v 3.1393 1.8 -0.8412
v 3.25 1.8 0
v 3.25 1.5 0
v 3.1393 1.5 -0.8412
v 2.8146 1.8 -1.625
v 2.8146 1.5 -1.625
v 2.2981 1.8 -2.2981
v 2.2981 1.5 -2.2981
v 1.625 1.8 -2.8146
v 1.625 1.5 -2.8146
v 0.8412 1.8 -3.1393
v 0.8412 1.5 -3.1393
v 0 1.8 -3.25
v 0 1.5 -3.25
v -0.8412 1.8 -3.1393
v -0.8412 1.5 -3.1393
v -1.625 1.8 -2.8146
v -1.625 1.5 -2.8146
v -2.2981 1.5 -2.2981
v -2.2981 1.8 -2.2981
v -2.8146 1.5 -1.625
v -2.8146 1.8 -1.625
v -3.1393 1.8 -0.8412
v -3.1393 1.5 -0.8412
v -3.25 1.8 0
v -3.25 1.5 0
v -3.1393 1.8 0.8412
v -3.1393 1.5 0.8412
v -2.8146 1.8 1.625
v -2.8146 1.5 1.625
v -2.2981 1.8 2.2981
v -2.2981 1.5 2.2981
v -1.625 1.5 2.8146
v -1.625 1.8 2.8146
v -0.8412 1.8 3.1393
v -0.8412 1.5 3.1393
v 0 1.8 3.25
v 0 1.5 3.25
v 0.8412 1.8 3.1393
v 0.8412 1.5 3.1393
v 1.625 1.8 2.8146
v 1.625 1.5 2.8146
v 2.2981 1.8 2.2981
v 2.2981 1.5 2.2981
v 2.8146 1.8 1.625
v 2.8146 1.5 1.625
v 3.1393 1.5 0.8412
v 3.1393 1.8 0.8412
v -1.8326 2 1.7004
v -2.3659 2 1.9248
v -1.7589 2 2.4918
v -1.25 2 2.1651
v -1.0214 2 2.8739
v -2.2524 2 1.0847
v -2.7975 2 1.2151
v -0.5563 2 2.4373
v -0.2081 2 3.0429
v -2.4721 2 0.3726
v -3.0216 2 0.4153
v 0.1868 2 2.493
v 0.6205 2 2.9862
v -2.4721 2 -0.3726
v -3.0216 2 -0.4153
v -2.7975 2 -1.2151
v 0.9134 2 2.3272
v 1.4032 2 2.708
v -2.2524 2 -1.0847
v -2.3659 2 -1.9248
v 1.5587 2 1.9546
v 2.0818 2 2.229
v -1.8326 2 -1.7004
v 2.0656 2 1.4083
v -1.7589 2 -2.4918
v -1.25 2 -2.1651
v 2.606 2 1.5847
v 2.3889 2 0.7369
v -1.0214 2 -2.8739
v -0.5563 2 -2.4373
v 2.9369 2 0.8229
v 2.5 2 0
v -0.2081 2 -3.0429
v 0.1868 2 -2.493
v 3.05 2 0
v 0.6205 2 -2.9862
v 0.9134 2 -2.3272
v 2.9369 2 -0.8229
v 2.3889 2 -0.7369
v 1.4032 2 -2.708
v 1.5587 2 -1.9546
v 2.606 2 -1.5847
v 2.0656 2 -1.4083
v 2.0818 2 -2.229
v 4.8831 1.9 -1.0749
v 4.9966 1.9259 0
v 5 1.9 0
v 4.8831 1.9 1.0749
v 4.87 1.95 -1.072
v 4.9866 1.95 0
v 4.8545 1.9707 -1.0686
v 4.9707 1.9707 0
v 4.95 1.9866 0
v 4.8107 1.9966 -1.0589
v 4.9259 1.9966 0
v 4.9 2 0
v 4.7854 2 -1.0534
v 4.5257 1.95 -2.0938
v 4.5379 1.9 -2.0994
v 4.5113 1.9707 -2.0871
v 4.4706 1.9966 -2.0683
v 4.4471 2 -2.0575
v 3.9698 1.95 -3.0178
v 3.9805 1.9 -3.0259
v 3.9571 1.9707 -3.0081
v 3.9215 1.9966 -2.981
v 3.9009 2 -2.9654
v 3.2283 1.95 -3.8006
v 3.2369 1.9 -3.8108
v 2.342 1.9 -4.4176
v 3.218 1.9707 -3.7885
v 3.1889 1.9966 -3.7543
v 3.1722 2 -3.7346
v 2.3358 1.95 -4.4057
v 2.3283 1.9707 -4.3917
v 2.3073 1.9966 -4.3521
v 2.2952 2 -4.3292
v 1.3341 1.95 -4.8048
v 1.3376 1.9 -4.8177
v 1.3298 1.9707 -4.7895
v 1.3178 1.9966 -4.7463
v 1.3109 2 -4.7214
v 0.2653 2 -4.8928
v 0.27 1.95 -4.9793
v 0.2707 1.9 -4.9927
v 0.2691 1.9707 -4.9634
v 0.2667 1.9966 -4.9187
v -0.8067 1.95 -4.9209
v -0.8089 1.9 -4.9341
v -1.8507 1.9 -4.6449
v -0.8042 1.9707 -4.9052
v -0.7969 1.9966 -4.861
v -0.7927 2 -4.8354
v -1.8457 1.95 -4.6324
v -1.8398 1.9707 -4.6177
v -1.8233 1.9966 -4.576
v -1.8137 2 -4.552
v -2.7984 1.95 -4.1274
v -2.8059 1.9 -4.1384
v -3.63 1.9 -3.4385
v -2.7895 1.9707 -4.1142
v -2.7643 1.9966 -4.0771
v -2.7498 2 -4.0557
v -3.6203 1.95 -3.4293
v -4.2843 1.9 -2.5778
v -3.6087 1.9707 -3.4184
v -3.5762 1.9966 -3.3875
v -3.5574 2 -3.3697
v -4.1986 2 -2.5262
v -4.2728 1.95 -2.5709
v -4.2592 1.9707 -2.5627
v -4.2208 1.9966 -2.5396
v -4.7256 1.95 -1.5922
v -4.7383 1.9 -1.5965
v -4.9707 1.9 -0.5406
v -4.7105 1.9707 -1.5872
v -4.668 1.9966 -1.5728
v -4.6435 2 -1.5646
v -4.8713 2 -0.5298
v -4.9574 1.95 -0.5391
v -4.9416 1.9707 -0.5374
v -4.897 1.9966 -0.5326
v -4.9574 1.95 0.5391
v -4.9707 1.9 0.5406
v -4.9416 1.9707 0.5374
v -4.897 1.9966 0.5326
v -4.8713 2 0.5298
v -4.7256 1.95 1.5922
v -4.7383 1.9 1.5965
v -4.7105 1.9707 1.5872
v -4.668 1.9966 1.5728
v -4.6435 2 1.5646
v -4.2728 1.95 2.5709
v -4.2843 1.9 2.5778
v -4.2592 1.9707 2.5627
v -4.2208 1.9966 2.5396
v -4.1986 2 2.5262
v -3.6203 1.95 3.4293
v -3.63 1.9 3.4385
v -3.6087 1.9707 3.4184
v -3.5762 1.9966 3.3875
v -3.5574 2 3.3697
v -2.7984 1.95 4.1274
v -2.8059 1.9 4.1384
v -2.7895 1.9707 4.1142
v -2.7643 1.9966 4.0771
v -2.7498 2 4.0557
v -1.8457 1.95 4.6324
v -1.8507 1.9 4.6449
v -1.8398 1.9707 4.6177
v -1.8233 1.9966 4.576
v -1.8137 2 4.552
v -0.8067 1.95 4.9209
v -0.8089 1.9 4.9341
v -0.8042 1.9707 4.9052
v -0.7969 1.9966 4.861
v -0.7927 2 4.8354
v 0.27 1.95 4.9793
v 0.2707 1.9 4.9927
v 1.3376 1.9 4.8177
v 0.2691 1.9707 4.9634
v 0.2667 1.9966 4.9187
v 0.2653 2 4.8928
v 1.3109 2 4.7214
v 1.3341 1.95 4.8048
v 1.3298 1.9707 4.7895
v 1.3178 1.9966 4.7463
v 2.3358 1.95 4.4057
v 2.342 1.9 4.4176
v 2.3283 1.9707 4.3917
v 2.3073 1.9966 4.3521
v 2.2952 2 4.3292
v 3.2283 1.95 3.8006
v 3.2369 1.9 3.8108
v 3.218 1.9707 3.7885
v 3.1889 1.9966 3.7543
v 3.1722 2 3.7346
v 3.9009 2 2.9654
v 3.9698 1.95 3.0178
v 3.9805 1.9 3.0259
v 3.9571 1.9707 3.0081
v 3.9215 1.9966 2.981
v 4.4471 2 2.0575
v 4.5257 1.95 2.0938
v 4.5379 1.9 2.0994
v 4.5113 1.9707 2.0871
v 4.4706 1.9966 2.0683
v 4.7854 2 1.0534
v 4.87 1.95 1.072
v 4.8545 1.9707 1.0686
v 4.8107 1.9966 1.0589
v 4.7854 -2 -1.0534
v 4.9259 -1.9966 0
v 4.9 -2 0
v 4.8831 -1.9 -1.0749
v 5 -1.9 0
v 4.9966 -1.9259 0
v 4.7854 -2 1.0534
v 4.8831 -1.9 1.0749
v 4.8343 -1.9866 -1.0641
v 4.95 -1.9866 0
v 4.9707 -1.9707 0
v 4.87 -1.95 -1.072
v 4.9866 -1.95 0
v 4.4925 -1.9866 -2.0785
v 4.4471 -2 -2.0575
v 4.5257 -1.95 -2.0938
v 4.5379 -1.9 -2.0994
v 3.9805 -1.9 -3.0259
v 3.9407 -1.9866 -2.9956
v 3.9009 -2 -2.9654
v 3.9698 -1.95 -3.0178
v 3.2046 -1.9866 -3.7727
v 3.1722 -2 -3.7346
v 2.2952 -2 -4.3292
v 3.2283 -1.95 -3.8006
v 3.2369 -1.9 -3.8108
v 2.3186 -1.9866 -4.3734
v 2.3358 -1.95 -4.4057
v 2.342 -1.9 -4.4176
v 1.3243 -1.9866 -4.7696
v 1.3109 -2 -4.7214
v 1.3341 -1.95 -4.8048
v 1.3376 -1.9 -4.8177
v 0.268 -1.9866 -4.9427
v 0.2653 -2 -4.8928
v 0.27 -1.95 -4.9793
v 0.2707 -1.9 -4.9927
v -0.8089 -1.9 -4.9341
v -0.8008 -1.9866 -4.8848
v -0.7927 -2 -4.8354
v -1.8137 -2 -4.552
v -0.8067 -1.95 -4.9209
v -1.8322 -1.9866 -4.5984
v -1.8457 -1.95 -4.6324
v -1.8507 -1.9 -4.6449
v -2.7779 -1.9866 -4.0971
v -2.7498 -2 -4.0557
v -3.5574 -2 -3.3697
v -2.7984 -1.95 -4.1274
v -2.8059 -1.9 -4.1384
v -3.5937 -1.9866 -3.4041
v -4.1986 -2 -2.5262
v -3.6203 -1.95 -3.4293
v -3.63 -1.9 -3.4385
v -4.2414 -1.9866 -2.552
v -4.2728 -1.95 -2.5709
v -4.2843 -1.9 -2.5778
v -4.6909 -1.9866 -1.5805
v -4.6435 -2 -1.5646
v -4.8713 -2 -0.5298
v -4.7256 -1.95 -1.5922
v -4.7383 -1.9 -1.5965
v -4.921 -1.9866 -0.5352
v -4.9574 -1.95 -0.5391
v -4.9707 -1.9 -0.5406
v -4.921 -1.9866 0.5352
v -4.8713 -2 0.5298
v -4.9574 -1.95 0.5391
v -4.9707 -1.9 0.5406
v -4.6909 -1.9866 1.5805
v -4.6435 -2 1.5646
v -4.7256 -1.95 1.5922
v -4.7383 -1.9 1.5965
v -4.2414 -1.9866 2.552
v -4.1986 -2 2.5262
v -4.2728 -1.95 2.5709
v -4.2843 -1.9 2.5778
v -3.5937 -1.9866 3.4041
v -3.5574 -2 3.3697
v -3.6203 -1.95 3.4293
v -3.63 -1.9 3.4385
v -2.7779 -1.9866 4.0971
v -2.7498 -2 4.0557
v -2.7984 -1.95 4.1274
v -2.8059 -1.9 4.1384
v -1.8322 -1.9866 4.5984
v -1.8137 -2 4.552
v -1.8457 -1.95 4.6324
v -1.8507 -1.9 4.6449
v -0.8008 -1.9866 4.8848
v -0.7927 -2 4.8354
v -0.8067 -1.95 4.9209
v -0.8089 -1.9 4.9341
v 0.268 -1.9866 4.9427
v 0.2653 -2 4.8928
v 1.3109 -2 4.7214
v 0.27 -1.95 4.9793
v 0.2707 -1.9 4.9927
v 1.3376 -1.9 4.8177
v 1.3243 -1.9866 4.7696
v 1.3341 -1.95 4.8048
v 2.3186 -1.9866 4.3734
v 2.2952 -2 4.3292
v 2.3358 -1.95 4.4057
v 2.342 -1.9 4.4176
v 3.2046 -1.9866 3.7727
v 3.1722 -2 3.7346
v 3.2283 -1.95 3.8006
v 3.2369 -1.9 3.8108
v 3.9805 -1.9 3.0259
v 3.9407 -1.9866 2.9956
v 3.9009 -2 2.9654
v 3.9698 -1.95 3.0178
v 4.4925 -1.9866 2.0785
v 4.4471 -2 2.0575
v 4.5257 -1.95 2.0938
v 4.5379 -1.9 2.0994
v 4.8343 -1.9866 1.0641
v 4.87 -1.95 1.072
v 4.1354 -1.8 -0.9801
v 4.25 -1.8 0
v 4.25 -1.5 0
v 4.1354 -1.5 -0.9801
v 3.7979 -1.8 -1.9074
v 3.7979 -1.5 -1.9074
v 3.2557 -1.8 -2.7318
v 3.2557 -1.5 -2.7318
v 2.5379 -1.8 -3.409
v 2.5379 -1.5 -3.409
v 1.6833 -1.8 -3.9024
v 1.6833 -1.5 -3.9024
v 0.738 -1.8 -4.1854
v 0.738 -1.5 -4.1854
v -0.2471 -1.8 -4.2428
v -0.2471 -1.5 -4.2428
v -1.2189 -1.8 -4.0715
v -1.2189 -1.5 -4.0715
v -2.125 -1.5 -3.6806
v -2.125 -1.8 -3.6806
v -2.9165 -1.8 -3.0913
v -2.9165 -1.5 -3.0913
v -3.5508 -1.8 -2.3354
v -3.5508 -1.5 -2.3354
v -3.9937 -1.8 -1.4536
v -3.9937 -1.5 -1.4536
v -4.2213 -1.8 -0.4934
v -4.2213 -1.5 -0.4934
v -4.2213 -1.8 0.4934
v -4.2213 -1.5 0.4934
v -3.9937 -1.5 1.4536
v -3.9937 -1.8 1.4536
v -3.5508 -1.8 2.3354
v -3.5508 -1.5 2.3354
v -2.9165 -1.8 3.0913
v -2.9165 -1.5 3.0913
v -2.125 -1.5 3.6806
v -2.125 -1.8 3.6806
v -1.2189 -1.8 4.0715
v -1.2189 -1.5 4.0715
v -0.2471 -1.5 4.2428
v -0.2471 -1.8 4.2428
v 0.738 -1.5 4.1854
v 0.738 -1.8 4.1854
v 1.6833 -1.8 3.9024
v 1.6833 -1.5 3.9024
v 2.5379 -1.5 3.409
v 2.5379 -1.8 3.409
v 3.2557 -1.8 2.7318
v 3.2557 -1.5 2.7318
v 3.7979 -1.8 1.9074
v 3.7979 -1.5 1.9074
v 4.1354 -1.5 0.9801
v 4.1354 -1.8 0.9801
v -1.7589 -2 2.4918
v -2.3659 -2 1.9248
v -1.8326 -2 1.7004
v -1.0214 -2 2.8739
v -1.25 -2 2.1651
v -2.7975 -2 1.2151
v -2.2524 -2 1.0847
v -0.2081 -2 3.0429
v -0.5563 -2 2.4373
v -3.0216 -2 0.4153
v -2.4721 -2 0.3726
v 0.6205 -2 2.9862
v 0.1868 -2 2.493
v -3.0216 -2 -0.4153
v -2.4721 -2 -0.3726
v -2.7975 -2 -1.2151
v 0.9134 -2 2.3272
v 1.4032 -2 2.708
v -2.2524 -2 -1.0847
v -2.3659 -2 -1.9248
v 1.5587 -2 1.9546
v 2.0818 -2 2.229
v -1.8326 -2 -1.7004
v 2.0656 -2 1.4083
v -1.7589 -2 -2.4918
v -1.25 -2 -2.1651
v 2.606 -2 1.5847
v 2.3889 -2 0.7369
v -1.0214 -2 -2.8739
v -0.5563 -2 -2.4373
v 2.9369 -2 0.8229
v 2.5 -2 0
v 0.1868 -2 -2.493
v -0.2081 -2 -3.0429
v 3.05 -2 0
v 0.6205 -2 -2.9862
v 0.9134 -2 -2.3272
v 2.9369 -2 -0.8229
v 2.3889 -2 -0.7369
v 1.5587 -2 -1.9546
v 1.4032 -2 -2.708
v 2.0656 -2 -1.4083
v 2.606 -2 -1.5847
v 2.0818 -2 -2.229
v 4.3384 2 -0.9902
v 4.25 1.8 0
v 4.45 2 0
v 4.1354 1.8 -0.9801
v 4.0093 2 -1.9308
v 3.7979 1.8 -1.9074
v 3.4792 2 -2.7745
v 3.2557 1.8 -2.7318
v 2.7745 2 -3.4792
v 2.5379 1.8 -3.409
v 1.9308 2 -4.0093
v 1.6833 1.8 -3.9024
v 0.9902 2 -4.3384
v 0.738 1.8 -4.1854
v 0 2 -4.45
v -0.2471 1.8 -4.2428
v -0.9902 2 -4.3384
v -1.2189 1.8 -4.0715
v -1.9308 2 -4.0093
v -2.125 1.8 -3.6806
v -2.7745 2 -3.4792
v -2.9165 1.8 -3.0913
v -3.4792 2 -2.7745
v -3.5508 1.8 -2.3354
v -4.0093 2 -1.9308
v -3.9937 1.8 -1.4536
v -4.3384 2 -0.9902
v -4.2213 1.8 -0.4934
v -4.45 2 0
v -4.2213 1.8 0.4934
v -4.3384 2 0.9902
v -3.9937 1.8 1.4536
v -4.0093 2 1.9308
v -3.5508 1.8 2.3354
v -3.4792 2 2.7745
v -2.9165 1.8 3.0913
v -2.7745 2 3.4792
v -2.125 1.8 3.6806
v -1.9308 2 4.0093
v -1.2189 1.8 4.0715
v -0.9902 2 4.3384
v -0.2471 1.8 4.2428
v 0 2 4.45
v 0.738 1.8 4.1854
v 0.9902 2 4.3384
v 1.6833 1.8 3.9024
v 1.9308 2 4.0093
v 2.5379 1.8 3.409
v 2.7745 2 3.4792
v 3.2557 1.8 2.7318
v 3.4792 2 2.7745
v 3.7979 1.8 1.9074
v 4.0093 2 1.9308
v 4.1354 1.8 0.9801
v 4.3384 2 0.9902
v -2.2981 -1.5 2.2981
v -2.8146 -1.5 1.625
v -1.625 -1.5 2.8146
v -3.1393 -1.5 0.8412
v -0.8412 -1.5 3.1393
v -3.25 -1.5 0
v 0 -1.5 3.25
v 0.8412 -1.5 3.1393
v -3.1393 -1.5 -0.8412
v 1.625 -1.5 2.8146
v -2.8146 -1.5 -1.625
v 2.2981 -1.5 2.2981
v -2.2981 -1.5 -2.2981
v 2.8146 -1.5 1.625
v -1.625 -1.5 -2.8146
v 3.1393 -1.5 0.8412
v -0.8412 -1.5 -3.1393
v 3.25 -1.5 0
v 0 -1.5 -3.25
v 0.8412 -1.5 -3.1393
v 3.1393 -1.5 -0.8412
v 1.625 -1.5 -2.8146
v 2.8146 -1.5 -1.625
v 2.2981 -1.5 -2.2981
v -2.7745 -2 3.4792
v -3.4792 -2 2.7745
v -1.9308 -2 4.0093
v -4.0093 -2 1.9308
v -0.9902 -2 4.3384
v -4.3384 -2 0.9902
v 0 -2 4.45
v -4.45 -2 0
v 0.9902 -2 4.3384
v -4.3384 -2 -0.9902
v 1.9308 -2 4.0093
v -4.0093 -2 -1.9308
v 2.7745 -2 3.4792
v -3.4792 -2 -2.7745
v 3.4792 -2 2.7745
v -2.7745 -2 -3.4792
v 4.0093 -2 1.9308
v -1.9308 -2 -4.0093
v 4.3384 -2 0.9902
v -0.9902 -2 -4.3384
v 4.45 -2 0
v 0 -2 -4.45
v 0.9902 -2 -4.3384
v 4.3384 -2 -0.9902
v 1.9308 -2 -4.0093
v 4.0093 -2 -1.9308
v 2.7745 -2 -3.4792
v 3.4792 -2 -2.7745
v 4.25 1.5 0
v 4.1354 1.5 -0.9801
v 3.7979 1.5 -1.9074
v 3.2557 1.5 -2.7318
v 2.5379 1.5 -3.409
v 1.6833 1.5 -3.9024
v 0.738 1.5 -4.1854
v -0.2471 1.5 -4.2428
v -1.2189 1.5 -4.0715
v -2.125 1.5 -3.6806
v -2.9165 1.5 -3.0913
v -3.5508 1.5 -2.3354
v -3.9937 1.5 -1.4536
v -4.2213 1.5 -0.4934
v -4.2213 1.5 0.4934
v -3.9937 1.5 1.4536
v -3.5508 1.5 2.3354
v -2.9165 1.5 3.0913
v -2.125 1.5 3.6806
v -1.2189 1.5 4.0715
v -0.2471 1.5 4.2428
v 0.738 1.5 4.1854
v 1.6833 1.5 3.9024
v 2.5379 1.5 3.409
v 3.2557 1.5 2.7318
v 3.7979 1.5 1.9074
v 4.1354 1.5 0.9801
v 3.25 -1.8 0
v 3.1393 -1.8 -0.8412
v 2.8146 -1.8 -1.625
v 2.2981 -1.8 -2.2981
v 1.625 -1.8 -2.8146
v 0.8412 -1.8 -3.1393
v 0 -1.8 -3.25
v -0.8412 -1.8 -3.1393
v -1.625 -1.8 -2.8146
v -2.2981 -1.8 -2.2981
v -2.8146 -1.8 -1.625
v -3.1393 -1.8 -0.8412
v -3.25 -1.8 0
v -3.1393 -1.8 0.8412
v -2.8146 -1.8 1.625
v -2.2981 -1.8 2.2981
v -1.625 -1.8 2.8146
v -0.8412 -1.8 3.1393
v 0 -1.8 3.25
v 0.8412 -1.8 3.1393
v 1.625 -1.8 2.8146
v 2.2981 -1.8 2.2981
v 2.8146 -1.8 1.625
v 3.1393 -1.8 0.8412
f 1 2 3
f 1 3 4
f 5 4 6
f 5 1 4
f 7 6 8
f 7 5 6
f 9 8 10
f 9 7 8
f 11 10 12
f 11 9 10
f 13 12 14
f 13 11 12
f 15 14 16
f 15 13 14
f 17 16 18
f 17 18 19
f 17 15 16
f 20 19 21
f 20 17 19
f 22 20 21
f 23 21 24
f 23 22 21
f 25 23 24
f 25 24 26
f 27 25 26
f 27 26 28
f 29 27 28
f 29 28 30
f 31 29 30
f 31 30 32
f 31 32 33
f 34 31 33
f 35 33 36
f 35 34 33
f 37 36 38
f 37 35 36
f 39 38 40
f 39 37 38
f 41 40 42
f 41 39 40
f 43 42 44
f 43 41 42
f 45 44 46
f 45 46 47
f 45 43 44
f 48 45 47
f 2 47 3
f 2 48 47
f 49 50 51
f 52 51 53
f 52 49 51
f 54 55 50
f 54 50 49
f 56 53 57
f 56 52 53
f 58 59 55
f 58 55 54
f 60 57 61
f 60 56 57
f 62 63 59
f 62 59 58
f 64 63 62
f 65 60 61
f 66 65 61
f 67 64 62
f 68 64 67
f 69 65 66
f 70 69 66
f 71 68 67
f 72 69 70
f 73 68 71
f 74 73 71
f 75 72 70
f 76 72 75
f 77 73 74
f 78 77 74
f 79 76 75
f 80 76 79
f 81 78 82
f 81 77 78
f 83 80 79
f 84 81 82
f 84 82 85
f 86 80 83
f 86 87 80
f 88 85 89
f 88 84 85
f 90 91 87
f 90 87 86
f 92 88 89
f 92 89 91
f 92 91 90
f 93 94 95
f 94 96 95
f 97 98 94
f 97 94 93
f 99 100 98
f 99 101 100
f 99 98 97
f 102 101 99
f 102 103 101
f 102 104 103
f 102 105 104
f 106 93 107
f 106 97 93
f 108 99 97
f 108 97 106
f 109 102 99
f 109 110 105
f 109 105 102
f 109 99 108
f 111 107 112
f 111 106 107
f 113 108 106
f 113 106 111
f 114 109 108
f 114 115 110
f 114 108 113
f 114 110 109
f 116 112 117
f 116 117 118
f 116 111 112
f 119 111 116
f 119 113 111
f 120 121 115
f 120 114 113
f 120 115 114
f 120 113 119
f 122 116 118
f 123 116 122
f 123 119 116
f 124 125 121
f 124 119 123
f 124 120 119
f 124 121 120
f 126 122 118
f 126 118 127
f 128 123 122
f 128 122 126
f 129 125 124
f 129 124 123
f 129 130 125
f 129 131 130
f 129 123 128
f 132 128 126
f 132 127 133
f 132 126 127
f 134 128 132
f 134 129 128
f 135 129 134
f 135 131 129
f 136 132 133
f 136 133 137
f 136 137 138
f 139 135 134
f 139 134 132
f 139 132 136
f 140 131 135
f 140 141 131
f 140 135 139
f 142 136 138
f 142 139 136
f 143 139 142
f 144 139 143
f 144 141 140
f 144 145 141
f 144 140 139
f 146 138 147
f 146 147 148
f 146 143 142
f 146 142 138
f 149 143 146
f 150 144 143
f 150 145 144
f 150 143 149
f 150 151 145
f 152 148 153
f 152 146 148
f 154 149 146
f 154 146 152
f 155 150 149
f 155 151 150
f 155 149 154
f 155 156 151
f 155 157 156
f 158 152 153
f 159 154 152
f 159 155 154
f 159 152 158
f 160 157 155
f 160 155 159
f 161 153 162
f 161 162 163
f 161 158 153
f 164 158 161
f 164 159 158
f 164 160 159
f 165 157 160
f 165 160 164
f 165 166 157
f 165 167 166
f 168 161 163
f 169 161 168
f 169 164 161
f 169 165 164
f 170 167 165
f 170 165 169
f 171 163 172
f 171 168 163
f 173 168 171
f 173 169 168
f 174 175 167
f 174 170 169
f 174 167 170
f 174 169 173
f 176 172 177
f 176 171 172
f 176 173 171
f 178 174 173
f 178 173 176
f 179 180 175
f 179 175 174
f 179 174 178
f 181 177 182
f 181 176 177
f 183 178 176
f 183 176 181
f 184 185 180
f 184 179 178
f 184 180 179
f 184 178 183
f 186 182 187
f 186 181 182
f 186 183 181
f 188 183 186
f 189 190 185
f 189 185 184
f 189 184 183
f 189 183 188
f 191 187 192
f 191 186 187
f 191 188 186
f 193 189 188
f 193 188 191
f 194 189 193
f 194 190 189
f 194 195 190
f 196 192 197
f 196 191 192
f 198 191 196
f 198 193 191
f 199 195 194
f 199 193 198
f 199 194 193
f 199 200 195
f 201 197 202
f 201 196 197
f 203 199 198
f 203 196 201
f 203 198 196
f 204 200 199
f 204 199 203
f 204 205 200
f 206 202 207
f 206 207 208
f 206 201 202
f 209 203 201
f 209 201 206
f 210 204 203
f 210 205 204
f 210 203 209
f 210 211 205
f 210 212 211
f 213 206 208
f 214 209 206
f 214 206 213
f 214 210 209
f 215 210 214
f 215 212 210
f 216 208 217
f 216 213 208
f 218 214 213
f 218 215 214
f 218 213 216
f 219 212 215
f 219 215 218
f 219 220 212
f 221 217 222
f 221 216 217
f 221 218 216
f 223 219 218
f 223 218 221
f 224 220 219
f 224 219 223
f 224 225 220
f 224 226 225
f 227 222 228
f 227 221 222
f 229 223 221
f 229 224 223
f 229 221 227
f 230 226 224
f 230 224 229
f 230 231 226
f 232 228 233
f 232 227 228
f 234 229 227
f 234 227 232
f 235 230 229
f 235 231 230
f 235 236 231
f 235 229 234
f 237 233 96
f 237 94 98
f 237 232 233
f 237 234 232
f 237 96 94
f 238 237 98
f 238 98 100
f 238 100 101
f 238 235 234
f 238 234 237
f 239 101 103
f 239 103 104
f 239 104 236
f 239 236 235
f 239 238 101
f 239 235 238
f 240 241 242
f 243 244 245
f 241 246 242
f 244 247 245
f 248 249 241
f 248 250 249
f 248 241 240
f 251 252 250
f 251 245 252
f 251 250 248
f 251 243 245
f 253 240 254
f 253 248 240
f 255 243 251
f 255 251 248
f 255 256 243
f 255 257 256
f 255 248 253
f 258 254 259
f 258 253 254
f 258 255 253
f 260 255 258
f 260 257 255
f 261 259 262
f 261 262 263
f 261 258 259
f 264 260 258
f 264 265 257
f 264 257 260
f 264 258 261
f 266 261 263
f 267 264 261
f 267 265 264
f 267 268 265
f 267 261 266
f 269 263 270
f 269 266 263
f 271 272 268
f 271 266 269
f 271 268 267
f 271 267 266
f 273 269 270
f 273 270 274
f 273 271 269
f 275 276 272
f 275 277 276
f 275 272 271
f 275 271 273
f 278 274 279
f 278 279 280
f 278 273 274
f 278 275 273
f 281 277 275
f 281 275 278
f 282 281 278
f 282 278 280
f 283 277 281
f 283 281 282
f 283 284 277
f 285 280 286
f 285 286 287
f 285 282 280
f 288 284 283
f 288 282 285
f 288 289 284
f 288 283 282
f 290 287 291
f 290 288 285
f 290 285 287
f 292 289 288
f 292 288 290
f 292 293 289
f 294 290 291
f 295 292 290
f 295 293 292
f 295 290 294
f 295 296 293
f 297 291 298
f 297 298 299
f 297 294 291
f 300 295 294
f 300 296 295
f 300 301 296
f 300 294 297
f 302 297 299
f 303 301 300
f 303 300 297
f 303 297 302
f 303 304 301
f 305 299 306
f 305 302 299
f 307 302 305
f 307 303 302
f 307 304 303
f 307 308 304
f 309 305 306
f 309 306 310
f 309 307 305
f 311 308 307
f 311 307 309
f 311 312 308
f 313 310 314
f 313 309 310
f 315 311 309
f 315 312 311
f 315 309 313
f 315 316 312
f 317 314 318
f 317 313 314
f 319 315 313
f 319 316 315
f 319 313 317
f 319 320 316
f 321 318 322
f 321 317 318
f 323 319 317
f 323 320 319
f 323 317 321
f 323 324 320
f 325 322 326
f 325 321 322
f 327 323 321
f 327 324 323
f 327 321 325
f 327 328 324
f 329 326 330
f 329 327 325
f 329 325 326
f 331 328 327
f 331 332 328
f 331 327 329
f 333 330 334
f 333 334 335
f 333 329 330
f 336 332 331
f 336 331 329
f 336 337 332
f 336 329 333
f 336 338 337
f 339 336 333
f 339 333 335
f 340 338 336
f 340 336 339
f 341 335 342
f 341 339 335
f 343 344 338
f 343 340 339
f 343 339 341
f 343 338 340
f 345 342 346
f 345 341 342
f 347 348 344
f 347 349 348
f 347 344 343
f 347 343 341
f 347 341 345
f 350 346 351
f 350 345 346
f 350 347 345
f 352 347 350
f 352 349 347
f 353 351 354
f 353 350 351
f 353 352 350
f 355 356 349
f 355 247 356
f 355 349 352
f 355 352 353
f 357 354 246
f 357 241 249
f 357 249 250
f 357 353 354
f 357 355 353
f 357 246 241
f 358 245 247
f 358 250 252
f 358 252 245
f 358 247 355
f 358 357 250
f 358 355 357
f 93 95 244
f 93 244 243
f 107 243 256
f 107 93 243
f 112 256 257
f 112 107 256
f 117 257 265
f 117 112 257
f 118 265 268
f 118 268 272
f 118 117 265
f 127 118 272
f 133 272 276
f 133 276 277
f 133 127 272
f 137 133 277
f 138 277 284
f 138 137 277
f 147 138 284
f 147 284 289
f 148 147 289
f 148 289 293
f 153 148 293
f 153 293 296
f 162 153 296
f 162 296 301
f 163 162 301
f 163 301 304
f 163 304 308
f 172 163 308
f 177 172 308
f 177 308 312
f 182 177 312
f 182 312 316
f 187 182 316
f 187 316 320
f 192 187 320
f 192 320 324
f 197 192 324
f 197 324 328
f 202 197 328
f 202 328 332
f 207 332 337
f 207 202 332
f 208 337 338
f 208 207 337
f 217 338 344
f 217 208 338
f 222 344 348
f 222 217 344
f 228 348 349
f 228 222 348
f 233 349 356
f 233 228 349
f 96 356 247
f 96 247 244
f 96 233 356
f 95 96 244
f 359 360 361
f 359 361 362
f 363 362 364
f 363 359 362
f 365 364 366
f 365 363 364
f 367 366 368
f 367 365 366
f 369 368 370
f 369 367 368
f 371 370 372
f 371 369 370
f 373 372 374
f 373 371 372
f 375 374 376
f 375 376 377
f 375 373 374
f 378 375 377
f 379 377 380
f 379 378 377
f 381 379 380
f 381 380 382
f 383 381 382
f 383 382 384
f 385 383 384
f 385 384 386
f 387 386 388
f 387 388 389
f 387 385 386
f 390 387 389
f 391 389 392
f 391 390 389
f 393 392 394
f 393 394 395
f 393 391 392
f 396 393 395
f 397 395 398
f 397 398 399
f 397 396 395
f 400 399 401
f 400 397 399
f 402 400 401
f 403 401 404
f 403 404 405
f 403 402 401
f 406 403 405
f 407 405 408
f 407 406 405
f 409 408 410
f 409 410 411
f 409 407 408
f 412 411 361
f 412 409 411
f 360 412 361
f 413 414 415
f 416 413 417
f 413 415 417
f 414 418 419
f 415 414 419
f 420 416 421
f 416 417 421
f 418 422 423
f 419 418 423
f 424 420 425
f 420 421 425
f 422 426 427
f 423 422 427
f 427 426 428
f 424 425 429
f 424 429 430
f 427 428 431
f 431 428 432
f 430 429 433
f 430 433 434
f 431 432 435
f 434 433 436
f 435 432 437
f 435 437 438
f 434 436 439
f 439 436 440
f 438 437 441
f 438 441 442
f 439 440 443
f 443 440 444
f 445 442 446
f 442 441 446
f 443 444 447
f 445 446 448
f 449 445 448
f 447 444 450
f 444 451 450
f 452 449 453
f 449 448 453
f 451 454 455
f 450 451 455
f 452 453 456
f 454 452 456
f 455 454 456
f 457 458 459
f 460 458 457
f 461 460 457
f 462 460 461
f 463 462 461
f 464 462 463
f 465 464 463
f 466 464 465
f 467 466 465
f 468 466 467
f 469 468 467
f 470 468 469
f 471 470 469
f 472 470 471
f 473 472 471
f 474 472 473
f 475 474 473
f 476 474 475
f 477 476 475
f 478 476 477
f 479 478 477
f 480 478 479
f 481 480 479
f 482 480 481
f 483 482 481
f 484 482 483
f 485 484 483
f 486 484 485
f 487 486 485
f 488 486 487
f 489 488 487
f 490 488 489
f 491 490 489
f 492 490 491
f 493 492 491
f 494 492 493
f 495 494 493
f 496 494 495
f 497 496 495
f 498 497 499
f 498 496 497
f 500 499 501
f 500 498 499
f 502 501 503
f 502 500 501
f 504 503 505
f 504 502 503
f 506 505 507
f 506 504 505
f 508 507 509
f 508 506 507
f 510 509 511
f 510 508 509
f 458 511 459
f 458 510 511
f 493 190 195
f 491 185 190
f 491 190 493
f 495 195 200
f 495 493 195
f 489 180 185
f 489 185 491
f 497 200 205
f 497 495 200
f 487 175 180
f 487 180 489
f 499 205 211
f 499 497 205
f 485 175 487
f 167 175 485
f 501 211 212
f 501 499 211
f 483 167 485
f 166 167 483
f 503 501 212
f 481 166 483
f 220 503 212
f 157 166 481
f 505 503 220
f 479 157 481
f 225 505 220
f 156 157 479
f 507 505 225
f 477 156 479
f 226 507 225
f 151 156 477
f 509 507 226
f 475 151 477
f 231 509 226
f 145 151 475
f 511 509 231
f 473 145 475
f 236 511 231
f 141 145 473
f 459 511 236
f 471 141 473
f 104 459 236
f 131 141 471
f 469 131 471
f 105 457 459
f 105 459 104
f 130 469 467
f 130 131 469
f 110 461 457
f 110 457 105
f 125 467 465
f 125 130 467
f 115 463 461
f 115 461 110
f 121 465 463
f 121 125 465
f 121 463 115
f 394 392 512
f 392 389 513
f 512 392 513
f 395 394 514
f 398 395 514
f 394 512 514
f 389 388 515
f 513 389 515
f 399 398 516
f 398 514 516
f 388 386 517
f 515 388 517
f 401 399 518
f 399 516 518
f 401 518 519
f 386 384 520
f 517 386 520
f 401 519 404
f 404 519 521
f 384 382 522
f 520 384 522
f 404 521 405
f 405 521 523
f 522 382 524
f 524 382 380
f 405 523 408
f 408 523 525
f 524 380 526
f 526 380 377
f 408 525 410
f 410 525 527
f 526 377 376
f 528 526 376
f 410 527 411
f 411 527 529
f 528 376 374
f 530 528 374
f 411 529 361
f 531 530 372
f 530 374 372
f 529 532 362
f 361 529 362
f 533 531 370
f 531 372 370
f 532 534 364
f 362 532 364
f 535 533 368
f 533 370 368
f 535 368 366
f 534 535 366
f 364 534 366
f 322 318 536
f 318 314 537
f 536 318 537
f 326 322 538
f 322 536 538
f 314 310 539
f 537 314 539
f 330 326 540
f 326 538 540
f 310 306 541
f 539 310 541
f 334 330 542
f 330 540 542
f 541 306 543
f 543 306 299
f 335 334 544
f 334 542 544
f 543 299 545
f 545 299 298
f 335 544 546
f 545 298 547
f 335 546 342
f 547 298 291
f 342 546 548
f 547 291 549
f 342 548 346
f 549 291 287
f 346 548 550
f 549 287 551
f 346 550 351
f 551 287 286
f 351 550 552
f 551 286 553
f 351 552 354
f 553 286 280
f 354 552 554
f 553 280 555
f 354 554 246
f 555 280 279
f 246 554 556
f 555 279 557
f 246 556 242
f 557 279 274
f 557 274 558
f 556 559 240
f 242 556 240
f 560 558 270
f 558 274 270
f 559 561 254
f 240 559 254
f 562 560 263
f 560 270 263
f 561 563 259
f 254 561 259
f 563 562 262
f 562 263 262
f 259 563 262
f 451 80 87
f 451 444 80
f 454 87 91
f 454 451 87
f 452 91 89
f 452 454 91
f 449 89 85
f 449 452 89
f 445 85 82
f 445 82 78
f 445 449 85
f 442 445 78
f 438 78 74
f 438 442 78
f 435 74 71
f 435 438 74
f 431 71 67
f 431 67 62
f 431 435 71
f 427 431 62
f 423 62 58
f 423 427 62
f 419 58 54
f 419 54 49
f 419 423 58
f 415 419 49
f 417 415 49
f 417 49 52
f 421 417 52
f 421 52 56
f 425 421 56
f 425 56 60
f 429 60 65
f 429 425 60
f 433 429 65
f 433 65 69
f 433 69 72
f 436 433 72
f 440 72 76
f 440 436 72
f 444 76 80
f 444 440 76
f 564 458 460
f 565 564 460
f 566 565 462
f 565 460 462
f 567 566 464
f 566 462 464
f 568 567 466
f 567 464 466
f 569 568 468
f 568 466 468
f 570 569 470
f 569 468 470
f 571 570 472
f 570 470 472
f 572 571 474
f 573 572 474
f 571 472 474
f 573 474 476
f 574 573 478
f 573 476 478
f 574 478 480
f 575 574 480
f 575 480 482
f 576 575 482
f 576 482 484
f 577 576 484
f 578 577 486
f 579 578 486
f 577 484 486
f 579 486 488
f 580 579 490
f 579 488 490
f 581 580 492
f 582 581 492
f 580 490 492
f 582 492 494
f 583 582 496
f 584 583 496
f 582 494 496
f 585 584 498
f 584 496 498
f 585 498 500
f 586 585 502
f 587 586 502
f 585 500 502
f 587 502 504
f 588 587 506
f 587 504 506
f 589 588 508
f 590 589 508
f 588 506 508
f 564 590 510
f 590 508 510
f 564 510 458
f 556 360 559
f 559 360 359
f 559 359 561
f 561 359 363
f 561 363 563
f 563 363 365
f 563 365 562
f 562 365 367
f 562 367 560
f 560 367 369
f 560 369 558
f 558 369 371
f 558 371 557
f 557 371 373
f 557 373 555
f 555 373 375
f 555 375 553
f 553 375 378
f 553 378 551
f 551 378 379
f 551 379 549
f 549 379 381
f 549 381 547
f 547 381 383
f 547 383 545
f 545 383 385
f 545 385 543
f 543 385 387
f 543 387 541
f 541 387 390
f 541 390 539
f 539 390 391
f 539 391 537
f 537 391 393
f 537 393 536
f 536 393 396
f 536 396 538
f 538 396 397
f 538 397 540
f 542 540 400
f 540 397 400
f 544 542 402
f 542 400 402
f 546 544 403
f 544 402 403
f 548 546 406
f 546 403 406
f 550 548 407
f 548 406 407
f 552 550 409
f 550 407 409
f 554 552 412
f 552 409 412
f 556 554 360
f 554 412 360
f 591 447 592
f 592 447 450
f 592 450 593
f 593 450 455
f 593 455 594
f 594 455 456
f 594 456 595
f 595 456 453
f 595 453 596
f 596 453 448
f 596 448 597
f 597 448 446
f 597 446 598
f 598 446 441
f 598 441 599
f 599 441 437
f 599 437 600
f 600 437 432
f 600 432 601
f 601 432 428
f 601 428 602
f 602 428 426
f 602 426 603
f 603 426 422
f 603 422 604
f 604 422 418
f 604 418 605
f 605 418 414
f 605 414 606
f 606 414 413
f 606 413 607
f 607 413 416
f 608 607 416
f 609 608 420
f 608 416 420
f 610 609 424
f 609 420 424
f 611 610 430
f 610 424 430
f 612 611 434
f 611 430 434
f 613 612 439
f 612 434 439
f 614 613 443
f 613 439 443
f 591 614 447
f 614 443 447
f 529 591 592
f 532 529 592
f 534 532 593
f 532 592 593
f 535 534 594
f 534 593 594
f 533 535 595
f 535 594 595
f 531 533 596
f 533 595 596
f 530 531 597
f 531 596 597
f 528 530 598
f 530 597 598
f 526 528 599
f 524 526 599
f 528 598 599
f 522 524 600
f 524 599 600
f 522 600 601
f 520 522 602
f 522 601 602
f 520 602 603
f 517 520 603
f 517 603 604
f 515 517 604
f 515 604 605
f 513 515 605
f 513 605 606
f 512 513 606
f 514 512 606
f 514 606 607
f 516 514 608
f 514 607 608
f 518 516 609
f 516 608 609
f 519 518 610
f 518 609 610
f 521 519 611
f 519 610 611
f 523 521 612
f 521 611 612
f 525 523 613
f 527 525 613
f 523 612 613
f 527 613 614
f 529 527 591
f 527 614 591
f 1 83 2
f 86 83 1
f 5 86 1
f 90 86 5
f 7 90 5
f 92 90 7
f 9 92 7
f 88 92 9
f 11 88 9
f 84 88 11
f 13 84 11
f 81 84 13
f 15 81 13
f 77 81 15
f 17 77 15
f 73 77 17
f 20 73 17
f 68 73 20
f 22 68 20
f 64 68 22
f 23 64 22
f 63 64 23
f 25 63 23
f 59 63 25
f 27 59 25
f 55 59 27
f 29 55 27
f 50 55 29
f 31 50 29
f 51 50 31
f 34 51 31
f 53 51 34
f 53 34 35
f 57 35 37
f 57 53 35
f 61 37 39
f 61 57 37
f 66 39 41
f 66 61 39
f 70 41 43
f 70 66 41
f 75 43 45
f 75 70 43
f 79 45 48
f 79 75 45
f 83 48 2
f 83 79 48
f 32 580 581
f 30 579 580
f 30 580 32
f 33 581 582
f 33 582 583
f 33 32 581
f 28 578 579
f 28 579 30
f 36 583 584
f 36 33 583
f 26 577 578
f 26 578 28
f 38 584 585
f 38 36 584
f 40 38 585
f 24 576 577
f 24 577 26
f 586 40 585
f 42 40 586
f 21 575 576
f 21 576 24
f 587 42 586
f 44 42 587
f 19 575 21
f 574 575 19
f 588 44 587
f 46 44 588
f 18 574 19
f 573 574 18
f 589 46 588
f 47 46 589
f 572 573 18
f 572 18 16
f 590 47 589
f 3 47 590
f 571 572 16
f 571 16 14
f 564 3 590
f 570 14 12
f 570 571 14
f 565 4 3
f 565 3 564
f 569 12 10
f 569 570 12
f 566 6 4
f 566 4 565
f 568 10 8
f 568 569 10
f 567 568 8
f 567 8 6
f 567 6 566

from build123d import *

# Parameters (mm, degrees)
SKETCH2_R           = 5
SKETCH2_R_2         = 2.5
BOSS_EXTRUDE1_DEPTH = 2
SKETCH3_R           = 4.25
SKETCH3_R_2         = 3.25
CUT_EXTRUDE1_DEPTH  = 0.5
CHAMFER1_SIZE       = 0.2
FILLET1_R           = 0.1


with BuildPart() as part:
    # Sketch2 → Boss-Extrude1 (new body, symmetric)
    with BuildSketch(Plane(origin=(0, 0, 0), x_dir=(1, 0, 0), z_dir=(0, 1, 0))):
        Circle(SKETCH2_R)
        Circle(SKETCH2_R_2, mode=Mode.SUBTRACT)
    extrude(amount=BOSS_EXTRUDE1_DEPTH, both=True)

    # Sketch3 → Cut-Extrude1 (cut)
    with BuildSketch(Plane(origin=(0, 2, 0), x_dir=(1, 0, 0), z_dir=(0, 1, 0))):
        Circle(SKETCH3_R)
        Circle(SKETCH3_R_2, mode=Mode.SUBTRACT)
    cut_extrude1 = extrude(amount=-CUT_EXTRUDE1_DEPTH, mode=Mode.SUBTRACT)

    # Mirror1: Cut-Extrude1 across plane
    add(cut_extrude1.mirror(Plane.ZX), mode=Mode.SUBTRACT)

    # Chamfer1
    chamfer1_edges = [part.edges().sort_by_distance(p)[0] for p in [
        (-4.25, 2, 0),
        (-3.25, 2, 0),
        (-3.25, -2, 0),
        (-4.25, -2, 0),
    ]]
    chamfer(chamfer1_edges, length=CHAMFER1_SIZE)

    # Fillet1
    fillet1_edges = [part.edges().sort_by_distance(p)[0] for p in [
        (-5, -2, 0),
        (-5, 2, 0),
    ]]
    fillet(fillet1_edges, radius=FILLET1_R)


solid = part.part
